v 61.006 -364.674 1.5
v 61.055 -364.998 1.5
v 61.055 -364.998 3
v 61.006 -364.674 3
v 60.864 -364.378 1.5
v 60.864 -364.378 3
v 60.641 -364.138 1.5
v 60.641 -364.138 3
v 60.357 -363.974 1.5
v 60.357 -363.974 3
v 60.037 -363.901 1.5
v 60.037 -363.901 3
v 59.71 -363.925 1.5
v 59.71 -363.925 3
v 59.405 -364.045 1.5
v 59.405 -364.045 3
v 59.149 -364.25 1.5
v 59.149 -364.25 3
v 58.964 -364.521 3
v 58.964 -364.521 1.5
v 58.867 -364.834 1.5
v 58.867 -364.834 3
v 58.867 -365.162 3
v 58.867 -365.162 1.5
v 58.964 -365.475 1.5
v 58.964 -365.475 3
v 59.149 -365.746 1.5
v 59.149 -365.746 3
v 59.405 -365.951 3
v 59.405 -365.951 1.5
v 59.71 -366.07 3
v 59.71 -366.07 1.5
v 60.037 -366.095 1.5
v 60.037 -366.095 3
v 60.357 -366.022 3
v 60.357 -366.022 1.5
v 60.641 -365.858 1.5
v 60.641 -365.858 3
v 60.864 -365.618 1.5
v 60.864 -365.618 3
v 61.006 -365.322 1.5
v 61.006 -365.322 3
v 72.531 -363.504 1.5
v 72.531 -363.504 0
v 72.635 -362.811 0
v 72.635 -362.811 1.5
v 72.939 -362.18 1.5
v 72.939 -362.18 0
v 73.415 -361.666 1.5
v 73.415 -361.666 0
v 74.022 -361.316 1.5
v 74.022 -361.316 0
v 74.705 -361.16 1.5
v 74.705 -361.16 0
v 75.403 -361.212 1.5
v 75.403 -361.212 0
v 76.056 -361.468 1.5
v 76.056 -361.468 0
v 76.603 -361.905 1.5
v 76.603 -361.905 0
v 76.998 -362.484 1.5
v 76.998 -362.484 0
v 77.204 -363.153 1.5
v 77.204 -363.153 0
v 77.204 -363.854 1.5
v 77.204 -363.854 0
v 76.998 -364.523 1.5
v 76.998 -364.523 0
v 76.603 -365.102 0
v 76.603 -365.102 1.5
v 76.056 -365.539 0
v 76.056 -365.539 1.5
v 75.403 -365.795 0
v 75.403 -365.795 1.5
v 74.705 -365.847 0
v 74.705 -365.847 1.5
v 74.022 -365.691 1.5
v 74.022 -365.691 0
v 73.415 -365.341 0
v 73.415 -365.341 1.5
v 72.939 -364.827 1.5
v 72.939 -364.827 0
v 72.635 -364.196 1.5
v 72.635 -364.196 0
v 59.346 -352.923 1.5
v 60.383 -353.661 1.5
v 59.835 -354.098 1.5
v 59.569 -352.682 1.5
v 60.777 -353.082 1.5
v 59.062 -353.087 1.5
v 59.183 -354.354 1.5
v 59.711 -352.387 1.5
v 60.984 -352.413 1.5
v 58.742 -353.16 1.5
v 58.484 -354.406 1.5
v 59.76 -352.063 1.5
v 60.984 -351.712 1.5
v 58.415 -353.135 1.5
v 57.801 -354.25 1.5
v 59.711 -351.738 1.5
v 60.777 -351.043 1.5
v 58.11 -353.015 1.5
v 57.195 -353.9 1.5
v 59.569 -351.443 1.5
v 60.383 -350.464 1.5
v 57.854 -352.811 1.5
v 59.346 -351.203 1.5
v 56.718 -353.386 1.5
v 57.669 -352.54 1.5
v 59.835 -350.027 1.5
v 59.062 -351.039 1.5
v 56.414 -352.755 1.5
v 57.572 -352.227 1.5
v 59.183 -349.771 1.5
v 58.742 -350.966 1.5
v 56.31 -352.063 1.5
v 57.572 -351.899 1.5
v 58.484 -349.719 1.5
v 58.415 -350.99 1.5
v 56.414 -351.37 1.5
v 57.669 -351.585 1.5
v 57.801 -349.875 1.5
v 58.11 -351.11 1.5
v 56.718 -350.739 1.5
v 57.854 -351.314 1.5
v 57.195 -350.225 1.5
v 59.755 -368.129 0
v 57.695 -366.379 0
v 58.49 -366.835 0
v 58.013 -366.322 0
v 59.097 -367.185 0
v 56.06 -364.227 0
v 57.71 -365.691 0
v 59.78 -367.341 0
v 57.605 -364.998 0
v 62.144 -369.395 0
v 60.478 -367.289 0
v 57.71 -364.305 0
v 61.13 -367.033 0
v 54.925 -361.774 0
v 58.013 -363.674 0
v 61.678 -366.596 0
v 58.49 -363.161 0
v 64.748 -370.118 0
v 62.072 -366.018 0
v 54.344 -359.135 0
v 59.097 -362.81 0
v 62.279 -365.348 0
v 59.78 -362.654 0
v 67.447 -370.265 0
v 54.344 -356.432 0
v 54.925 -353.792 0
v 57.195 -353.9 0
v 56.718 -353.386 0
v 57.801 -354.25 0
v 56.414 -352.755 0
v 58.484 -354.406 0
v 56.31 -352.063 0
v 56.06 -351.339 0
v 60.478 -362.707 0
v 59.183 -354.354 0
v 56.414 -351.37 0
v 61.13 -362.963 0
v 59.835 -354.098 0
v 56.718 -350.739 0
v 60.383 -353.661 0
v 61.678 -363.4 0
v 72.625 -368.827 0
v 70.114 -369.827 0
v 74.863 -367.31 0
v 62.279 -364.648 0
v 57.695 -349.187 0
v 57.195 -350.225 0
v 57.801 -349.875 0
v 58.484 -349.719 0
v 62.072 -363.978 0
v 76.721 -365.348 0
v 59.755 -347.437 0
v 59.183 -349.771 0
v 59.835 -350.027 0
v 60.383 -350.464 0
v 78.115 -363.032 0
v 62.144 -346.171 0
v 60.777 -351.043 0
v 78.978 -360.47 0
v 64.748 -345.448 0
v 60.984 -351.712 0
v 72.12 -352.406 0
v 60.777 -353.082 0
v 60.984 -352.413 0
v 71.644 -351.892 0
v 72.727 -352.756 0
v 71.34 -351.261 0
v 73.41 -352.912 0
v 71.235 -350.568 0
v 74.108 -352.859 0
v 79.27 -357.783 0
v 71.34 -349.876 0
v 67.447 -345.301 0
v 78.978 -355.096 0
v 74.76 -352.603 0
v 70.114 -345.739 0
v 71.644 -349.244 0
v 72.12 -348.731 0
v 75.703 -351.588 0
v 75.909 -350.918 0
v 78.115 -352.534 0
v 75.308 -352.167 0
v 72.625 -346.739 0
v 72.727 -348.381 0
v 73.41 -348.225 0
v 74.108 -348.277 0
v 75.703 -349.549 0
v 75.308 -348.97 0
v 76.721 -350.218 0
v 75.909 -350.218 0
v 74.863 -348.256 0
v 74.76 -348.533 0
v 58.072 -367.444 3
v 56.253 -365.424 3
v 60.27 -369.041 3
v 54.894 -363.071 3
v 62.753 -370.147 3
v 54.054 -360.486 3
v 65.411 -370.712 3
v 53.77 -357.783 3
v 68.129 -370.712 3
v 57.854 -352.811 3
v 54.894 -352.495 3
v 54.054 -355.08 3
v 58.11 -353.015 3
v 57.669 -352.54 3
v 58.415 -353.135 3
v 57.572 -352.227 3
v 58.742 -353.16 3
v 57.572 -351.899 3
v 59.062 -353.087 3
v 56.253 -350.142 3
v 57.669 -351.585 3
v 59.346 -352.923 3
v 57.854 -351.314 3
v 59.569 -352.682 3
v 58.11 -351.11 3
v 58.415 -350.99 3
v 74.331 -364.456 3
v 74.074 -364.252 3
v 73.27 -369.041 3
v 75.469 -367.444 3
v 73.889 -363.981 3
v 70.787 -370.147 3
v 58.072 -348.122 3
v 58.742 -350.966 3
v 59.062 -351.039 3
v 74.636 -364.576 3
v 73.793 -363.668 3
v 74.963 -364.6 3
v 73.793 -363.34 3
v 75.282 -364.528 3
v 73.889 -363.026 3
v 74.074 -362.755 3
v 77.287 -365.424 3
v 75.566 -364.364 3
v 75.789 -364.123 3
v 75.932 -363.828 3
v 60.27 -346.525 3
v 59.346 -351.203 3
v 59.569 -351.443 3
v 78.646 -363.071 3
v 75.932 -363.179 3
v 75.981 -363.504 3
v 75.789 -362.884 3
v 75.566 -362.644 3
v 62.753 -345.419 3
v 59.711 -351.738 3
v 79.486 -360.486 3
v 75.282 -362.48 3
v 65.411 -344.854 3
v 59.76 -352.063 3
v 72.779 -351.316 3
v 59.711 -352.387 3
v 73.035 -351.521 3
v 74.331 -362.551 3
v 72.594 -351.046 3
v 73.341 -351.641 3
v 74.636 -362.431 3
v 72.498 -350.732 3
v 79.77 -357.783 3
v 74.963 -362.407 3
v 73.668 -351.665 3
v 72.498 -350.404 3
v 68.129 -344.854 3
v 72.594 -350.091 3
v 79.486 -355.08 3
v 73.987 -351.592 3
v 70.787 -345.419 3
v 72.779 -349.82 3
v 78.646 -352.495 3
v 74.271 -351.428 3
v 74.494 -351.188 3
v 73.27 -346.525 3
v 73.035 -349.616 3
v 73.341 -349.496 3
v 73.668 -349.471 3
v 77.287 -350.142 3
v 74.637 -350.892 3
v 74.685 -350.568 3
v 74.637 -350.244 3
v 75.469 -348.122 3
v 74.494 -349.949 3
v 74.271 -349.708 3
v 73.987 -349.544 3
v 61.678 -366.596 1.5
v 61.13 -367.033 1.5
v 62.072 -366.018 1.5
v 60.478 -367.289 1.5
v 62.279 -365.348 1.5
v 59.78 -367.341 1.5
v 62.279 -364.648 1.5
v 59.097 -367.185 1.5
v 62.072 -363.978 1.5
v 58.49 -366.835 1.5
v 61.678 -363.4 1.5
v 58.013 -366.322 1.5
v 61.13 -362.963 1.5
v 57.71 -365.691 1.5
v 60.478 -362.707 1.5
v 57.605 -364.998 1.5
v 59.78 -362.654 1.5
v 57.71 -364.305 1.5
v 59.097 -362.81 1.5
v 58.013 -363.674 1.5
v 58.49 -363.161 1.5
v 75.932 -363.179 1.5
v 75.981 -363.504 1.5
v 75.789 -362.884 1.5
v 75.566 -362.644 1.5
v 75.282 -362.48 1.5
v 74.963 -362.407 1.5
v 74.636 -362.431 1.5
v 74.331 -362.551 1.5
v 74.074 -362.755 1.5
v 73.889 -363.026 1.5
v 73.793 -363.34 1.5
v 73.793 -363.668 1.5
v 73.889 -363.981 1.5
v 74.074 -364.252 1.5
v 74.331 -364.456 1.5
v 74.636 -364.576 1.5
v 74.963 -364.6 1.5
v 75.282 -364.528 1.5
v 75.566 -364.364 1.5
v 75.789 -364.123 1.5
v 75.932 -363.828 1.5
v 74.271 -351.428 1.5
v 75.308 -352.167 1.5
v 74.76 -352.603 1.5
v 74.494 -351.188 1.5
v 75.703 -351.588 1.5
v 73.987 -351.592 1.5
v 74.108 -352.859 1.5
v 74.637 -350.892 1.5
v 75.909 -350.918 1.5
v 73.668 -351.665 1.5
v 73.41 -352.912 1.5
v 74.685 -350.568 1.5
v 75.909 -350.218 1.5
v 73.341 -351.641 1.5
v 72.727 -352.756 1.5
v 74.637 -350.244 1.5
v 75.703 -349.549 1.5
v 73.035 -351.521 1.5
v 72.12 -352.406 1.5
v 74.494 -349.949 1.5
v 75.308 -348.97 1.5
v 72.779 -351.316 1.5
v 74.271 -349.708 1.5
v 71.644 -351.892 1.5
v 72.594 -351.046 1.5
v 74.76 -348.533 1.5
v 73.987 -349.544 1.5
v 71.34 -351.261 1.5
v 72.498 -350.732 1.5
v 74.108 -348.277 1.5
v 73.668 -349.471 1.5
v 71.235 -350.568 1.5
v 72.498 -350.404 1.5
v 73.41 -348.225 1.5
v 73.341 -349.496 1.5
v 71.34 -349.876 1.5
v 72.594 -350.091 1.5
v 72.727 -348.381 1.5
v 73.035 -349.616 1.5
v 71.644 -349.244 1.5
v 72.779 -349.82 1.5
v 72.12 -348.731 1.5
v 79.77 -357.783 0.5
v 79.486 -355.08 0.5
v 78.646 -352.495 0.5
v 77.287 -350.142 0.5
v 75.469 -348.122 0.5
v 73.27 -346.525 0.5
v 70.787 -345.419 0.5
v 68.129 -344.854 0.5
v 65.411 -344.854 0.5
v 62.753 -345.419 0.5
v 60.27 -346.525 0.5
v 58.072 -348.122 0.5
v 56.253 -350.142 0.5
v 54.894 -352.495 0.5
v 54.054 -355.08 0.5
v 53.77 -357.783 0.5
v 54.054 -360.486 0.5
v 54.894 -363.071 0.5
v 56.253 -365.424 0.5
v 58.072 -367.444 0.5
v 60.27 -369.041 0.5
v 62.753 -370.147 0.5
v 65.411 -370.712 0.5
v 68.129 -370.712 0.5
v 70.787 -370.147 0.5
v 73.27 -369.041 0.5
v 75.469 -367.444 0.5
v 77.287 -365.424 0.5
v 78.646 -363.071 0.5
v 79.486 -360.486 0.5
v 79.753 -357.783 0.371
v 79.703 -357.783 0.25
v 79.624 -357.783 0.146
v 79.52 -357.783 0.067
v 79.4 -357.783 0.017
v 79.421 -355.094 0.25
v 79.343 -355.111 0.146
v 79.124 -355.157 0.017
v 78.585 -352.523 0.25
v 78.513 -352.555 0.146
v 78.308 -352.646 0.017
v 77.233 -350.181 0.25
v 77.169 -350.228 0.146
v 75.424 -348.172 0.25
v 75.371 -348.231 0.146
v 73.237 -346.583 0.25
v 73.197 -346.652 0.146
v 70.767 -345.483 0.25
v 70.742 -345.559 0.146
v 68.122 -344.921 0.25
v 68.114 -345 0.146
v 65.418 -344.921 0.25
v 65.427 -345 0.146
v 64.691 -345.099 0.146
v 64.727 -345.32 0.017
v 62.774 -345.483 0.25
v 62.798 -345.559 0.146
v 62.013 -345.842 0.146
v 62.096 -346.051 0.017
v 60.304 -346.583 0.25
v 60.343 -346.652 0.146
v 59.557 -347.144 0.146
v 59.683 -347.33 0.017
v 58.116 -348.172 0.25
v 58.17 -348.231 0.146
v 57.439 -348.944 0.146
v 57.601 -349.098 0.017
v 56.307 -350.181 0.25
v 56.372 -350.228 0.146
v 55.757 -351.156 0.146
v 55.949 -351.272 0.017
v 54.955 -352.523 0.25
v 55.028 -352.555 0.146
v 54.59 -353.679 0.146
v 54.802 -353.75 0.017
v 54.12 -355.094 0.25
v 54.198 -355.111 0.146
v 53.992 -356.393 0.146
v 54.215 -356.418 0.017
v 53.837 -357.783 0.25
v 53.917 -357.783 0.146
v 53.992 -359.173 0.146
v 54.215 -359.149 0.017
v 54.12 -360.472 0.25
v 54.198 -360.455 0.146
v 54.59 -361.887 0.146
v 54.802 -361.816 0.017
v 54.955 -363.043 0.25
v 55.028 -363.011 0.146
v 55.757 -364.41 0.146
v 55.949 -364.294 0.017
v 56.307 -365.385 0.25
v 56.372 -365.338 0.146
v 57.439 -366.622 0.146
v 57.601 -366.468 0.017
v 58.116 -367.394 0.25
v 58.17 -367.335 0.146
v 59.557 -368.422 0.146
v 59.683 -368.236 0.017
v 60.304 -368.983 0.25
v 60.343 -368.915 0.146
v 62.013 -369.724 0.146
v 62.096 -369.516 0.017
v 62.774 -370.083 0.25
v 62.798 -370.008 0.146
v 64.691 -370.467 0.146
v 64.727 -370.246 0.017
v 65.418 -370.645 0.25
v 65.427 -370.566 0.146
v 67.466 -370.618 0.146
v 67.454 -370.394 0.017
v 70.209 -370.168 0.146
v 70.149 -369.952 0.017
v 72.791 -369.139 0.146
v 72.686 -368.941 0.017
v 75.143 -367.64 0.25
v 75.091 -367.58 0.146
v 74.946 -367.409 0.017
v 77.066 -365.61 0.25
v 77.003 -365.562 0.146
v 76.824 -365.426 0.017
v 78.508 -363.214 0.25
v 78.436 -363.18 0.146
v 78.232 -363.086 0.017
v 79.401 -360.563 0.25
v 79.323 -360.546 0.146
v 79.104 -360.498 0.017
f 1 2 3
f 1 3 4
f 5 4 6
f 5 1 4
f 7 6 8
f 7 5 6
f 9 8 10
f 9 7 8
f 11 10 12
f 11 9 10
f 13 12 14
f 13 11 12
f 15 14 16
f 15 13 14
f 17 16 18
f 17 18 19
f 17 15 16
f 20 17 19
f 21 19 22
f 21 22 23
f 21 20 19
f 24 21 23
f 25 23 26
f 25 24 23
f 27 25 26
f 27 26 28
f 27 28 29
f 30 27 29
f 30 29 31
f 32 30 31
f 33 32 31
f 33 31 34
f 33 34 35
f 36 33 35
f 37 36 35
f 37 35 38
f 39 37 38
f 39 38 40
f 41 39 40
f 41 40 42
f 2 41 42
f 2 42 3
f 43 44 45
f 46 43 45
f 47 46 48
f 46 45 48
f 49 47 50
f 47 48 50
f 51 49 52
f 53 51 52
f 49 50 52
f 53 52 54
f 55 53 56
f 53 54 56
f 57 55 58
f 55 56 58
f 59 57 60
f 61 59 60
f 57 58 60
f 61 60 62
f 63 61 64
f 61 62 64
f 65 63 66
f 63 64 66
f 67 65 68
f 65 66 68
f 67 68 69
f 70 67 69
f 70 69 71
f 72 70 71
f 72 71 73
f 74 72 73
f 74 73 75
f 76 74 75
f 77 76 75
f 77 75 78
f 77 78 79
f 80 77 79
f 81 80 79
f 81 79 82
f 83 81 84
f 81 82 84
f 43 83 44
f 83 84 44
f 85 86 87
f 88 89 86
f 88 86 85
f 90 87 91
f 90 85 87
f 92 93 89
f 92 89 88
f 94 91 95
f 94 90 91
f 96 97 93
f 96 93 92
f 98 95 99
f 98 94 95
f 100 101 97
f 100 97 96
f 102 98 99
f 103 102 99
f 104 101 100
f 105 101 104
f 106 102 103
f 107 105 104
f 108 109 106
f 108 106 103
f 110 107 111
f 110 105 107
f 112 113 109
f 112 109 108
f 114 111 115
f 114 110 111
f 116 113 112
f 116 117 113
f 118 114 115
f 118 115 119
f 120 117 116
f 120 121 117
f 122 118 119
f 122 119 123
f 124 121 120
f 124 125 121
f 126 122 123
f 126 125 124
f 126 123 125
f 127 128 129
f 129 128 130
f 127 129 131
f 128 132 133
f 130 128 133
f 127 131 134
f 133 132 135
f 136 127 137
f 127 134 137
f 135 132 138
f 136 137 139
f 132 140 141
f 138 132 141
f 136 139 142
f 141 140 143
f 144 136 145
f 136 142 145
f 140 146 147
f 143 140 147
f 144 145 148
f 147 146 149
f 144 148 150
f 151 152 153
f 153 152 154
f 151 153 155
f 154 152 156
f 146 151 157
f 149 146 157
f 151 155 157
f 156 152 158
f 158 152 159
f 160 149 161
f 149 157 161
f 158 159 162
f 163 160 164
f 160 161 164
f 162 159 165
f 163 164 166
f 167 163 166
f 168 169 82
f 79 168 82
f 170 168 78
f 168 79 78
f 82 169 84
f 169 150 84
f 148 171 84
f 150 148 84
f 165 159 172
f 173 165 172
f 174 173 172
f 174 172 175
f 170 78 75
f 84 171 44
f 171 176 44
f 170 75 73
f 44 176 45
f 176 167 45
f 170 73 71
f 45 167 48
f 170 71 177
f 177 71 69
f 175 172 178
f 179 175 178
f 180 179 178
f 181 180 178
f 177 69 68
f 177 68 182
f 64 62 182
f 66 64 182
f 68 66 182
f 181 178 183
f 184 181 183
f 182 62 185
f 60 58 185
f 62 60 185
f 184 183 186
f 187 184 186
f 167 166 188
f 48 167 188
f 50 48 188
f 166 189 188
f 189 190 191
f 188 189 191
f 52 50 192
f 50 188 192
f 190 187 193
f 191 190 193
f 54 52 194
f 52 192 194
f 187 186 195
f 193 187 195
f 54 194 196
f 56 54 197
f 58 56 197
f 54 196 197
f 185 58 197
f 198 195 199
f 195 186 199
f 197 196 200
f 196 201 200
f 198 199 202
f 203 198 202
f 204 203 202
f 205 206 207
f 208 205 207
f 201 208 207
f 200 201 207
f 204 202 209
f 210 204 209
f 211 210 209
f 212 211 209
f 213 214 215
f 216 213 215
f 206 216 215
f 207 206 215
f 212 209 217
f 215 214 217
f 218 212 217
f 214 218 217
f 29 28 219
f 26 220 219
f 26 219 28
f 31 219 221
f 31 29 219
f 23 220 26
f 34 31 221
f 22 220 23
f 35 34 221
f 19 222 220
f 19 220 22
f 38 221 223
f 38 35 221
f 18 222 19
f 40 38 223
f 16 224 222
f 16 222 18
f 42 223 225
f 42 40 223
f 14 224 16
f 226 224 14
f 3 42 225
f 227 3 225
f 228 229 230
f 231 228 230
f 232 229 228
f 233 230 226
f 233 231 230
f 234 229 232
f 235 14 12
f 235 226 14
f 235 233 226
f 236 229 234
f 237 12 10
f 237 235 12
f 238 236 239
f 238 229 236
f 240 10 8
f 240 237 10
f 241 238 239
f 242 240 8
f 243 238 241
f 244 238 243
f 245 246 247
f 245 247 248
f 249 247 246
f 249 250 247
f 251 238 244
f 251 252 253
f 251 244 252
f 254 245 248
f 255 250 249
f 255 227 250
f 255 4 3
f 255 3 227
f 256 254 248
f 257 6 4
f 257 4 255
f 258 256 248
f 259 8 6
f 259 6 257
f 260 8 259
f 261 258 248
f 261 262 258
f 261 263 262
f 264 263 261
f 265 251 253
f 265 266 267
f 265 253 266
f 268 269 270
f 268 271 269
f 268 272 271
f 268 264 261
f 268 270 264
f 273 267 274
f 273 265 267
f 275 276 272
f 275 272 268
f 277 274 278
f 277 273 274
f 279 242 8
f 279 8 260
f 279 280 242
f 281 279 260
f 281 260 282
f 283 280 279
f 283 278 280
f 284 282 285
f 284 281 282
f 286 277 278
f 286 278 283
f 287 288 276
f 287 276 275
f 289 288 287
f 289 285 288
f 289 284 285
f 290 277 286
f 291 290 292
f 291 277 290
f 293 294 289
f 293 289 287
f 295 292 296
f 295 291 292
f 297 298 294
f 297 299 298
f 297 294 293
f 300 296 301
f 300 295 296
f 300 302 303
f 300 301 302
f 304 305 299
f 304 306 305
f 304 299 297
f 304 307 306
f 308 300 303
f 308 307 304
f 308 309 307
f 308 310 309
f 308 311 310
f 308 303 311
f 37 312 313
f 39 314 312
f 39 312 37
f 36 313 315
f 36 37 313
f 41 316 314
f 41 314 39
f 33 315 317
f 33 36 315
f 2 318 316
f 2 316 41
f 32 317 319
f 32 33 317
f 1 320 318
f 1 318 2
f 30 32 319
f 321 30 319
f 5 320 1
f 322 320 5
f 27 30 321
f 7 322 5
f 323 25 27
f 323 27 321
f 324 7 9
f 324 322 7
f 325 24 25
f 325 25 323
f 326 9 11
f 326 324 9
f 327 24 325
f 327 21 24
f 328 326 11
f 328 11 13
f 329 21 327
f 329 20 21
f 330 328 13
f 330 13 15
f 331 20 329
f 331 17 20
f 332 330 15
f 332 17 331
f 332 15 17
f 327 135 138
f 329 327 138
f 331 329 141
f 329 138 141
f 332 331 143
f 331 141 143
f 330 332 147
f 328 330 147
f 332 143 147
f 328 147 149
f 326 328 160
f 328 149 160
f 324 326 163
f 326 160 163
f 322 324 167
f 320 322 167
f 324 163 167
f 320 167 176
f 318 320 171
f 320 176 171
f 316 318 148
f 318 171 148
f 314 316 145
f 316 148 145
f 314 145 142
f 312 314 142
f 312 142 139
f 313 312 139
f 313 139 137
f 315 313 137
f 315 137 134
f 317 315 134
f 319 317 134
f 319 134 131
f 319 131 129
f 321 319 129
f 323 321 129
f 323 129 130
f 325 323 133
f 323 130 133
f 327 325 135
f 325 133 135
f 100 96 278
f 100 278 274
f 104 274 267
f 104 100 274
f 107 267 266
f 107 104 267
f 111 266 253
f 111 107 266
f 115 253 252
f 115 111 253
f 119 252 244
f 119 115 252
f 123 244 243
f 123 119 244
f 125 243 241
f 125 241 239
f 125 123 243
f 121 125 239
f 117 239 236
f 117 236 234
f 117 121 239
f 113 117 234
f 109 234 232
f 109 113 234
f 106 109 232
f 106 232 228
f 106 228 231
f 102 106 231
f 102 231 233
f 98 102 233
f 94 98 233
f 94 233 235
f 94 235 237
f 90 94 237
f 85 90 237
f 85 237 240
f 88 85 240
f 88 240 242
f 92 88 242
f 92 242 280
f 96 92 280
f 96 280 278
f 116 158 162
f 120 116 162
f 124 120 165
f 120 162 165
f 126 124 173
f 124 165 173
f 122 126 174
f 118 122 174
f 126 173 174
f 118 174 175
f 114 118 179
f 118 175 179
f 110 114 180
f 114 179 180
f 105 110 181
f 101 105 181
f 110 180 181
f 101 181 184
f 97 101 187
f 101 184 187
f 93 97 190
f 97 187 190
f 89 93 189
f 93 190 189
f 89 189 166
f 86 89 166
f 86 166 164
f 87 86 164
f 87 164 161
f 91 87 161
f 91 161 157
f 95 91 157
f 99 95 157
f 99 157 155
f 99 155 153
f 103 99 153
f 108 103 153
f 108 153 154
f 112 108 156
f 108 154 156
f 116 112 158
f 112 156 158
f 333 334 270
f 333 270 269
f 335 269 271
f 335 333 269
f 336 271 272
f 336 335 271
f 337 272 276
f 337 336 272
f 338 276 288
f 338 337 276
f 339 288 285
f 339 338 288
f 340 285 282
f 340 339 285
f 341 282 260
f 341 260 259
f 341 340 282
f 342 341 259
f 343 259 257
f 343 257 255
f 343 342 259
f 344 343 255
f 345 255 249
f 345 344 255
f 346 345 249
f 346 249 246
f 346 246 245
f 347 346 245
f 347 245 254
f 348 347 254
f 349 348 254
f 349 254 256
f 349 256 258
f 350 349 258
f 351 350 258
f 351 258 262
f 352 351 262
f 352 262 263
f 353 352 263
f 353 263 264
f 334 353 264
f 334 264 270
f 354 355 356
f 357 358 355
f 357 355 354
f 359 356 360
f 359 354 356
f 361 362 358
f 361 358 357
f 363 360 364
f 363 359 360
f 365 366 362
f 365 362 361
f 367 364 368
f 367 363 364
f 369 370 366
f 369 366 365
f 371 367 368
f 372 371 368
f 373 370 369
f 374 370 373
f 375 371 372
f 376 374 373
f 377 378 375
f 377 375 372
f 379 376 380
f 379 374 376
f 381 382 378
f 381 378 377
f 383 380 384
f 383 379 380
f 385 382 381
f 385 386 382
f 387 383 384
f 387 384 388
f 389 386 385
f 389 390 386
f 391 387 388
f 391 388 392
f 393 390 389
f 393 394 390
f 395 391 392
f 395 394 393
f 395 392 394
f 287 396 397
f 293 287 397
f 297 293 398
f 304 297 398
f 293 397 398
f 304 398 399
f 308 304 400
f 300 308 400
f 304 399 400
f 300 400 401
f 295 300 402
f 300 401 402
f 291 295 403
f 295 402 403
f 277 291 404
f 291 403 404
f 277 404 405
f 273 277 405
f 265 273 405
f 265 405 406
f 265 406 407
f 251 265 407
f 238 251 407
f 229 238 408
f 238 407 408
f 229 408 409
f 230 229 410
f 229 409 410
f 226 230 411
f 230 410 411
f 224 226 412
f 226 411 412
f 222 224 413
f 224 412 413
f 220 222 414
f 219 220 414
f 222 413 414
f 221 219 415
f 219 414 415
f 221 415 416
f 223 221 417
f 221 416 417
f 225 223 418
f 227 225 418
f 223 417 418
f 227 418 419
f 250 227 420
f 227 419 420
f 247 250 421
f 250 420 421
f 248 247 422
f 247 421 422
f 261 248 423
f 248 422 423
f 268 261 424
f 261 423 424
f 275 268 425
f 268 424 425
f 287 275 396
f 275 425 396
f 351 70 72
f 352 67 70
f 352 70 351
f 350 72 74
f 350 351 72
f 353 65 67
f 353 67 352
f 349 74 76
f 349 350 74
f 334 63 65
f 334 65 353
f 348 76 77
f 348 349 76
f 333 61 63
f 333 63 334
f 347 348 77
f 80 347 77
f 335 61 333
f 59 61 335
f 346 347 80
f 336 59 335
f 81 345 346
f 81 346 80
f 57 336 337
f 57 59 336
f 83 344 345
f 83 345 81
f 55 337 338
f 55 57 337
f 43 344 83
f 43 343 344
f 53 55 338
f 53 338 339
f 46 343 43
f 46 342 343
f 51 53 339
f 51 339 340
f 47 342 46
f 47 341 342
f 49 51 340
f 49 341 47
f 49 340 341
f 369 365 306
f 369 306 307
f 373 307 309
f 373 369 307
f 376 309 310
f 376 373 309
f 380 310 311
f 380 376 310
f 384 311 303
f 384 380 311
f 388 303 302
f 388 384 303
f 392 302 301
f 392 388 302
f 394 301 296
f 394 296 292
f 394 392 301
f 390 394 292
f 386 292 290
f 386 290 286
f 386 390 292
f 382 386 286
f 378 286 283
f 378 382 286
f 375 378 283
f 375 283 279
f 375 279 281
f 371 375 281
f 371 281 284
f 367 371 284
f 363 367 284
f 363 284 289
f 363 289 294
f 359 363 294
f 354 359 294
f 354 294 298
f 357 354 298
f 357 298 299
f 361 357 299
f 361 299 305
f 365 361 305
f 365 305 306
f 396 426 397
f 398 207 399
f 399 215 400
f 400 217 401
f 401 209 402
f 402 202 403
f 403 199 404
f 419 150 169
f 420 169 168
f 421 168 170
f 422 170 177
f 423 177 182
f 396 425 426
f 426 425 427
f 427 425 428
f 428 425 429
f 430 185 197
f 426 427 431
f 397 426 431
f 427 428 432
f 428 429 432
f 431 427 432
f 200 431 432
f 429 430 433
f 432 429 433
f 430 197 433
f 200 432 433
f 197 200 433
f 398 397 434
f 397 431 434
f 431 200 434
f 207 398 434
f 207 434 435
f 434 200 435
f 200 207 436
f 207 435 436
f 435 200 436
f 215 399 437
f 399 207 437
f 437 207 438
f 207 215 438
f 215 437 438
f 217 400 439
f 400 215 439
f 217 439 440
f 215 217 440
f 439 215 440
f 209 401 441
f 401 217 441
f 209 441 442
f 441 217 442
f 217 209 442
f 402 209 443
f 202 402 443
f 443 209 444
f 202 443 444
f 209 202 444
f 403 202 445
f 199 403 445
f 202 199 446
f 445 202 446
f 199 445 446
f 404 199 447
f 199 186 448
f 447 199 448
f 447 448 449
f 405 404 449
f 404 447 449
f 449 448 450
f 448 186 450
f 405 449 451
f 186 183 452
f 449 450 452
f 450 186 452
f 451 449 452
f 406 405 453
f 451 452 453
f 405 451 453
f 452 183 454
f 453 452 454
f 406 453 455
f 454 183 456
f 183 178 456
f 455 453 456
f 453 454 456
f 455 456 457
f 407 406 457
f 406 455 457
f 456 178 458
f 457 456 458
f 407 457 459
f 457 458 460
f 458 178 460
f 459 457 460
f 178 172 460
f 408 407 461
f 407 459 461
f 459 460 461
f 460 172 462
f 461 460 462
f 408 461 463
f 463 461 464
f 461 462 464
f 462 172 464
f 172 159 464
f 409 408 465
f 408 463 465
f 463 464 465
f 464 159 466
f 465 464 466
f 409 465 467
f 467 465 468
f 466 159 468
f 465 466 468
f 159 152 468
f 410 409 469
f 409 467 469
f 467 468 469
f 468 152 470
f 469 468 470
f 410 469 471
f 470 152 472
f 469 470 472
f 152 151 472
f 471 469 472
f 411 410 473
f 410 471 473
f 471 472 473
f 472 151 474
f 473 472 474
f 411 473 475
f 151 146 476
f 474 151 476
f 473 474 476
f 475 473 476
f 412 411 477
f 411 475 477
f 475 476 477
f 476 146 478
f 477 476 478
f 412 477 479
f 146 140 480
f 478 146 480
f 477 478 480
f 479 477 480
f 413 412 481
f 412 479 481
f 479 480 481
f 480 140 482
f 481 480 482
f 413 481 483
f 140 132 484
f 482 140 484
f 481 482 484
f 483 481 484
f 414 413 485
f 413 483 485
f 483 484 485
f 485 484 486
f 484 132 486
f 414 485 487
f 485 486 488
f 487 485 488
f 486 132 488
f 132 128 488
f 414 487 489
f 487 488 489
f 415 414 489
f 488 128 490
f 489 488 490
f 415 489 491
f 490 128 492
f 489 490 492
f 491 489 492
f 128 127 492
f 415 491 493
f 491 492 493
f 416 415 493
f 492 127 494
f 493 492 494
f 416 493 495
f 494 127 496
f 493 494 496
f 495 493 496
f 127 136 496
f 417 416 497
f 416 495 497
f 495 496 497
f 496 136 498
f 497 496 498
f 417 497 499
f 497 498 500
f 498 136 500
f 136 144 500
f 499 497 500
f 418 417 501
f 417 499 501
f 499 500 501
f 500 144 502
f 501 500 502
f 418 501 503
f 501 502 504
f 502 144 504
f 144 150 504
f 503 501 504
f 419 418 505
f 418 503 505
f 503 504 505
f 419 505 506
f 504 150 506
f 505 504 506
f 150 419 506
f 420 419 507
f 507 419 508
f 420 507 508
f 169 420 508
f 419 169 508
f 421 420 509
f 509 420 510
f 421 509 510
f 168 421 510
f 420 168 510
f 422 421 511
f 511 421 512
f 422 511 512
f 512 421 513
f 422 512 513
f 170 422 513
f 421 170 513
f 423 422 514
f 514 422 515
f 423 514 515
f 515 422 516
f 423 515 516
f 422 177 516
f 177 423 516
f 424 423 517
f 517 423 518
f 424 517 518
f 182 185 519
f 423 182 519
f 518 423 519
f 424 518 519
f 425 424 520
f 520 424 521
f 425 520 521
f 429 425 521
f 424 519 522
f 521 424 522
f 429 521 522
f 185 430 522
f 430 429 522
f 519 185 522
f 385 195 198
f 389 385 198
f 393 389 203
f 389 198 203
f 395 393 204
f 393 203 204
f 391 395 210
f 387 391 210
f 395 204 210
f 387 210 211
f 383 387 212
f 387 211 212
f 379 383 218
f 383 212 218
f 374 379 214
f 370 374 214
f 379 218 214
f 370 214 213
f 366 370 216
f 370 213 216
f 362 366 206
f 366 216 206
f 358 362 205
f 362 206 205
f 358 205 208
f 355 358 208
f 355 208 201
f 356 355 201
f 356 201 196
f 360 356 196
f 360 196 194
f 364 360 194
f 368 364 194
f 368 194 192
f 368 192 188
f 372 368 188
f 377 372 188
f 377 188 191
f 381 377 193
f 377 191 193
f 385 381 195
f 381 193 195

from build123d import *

# Parameters (mm, degrees)
SKETCH_1_R          = 13
SKETCH_1_R_2        = 1.1
EXTRUDE_1_DEPTH     = 3
FILLET_1_R          = 0.5
SKETCH_2_R          = 2.35
CUT_EXTRUDE_1_DEPTH = 1.5


with BuildPart() as part:
    # 草图1 → 凸台-拉伸1 (new body)
    with BuildSketch(Plane.XY):
        with Locations((66.770274295, -357.783074412)):
            Circle(SKETCH_1_R)
        with Locations((59.955130925, -364.997907801)):
            Circle(SKETCH_1_R_2, mode=Mode.SUBTRACT)
        with Locations((74.880510465, -363.503569956)):
            Circle(SKETCH_1_R_2, mode=Mode.SUBTRACT)
        with Locations((58.660038126, -352.062578867)):
            Circle(SKETCH_1_R_2, mode=Mode.SUBTRACT)
        with Locations((73.585417665, -350.568241022)):
            Circle(SKETCH_1_R_2, mode=Mode.SUBTRACT)
    extrude(amount=EXTRUDE_1_DEPTH)

    # 圆角1
    fillet_1_edges = [part.edges().sort_by_distance(p)[0] for p in [
        (53.770274295, -357.783074412, 0),
    ]]
    fillet(fillet_1_edges, radius=FILLET_1_R)

    # 草图2 → 切除-拉伸1 (cut)
    with BuildSketch(Plane(origin=(0, 0, 0), x_dir=(-1, 0, 0), z_dir=(0, 0, -1))):
        with Locations((-73.585417665, -350.568241022)):
            Circle(SKETCH_2_R)
        with Locations((-58.660038126, -352.062578867)):
            Circle(SKETCH_2_R)
        with Locations((-59.955130925, -364.997907801)):
            Circle(SKETCH_2_R)
        with Locations((-74.880510465, -363.503569956)):
            Circle(SKETCH_2_R)
    extrude(amount=-CUT_EXTRUDE_1_DEPTH, mode=Mode.SUBTRACT)


solid = part.part
